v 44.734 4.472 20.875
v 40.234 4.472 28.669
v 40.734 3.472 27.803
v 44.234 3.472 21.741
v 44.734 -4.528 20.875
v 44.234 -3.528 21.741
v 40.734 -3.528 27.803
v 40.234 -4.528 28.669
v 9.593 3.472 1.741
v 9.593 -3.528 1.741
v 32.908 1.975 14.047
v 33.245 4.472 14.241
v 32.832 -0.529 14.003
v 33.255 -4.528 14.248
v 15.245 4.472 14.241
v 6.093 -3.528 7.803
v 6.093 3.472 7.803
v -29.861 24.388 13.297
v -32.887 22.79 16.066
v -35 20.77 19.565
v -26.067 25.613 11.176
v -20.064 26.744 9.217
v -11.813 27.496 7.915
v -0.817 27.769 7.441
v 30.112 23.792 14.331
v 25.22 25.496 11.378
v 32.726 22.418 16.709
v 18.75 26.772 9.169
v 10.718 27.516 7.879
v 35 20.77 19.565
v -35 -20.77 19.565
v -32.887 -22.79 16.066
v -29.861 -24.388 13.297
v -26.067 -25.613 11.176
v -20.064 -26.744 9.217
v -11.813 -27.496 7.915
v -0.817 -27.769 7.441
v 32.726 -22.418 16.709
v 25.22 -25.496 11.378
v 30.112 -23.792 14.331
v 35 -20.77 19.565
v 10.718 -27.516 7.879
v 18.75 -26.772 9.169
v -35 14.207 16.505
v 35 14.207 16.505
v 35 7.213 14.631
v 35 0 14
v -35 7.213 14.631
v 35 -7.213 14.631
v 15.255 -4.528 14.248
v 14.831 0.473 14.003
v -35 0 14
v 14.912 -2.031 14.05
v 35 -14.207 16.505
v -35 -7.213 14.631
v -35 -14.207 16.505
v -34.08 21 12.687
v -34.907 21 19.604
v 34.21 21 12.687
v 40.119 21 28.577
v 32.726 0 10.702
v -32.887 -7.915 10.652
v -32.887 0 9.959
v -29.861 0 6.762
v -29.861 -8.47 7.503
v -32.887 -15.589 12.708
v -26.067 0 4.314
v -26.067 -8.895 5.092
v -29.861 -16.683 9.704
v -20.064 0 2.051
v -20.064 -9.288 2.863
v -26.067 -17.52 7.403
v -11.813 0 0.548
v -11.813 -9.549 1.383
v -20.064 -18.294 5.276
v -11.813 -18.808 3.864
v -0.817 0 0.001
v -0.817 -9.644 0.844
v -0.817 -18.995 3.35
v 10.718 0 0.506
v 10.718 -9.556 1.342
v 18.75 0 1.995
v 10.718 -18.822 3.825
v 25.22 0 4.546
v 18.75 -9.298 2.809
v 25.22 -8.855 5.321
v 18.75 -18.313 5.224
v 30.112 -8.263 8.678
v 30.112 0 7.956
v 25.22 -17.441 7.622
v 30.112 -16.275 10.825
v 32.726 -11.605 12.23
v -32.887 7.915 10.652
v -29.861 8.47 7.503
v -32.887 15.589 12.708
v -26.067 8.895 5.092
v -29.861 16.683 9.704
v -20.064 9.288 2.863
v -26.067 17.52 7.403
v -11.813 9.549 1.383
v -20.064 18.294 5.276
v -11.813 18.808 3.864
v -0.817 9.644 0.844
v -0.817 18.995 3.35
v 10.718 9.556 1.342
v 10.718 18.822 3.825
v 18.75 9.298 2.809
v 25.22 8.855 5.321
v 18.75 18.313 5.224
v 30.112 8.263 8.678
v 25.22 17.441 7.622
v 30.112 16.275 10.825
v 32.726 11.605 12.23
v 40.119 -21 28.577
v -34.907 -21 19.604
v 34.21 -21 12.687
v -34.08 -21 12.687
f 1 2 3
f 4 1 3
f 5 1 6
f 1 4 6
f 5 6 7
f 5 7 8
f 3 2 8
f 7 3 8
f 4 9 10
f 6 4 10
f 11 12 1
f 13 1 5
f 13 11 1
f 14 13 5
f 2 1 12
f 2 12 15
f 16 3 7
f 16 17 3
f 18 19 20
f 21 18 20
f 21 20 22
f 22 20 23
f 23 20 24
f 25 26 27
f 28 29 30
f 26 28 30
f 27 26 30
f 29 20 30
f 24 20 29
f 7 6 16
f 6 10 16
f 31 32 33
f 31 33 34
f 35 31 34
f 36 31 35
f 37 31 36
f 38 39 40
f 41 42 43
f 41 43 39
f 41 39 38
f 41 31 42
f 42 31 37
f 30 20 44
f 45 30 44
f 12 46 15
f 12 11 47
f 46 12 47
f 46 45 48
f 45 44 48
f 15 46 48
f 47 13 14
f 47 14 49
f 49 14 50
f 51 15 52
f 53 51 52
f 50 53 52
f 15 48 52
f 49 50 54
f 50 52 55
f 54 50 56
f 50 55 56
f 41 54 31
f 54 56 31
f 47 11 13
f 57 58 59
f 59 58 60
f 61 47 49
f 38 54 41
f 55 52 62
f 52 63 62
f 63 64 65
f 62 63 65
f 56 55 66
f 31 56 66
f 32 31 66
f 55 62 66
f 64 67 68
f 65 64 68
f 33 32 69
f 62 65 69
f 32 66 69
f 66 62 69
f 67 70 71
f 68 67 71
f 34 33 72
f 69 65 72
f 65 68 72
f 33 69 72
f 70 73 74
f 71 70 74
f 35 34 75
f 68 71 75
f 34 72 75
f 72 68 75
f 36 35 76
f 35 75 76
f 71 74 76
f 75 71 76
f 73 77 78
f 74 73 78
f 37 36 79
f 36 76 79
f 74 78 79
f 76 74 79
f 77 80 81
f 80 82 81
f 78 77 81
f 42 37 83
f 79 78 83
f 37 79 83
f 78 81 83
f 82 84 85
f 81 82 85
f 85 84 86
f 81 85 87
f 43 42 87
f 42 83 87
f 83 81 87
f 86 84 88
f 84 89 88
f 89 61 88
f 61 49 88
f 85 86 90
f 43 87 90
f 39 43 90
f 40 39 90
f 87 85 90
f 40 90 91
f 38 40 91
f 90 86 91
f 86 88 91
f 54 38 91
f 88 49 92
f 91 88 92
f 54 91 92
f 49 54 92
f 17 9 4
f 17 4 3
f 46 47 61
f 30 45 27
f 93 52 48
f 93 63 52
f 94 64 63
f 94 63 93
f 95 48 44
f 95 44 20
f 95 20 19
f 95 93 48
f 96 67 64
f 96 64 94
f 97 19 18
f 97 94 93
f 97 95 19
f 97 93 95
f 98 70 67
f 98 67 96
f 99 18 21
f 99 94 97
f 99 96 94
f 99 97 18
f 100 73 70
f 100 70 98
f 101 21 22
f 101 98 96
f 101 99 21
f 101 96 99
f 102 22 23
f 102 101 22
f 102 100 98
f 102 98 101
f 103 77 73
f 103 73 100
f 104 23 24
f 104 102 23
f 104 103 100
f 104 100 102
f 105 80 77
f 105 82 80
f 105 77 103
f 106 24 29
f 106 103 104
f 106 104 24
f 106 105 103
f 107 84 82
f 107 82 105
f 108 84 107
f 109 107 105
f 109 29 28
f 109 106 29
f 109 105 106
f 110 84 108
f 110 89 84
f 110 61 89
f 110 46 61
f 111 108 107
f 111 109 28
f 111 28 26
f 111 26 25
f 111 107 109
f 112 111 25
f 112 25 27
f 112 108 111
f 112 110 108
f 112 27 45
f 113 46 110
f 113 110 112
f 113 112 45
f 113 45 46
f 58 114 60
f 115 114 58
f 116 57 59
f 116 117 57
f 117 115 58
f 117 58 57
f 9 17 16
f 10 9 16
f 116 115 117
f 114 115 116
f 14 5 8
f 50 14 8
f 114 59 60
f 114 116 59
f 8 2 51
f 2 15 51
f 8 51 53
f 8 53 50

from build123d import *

# Parameters (mm, degrees)
F1_ANGLE = 60
F4_W     = 9
F4_H     = 9
F4_W_2   = 7
F4_H_2   = 7
F5_DEPTH = 25
F6_DEPTH = 15
F7_DEPTH = 25
F9_DEPTH = 21


with BuildPart() as f1:
    # F0 (on Front) → F1 (revolve, symmetric)
    with BuildSketch(Plane.XZ) as f1_sk:
        with BuildLine():
            add(Edge.make_bspline(
                [(-35, 14), (-30.648278, 1.834071), (1.345525, -1.881435), (27.957227, 1.928799), (35, 14)],
                knots=[0, 0, 0, 0, 37.696154, 75.392307, 75.392307, 75.392307, 75.392307], degree=3))
            Line((35, 14), (-35, 14))
        make_face()
    revolve(axis=Axis((3.602739, 0, 55.539034), (1, 0, 0)), revolution_arc=F1_ANGLE / 2)
    revolve(f1_sk.sketch, axis=Axis((3.602739, 0, 55.539034), (-1, 0, 0)), revolution_arc=F1_ANGLE / 2)

    # F4 (on face) → F5 (join)
    with BuildSketch(Plane(origin=(29.599278, 0, 17.089151), x_dir=(0, -1, 0), z_dir=(-0.866025, 0, -0.5))):
        with Locations((0.028123, 0.211167)):
            Rectangle(F4_W, F4_H)
        with Locations((0.028123, 0.211167)):
            Rectangle(F4_W_2, F4_H_2, mode=Mode.SUBTRACT)
    extrude(amount=F5_DEPTH)

    # F4 (on face) → F6 (join)
    with BuildSketch(Plane(origin=(29.599278, 0, 17.089151), x_dir=(0, -1, 0), z_dir=(-0.866025, 0, -0.5))):
        with Locations((0.028123, 0.211167)):
            Rectangle(F4_W, F4_H)
        with Locations((0.028123, 0.211167)):
            Rectangle(F4_W_2, F4_H_2, mode=Mode.SUBTRACT)
    extrude(amount=-F6_DEPTH)

    # F4 (on face) → F7 (cut)
    with BuildSketch(Plane(origin=(29.599278, 0, 17.089151), x_dir=(0, -1, 0), z_dir=(-0.866025, 0, -0.5))):
        with Locations((0.028123, 0.211167)):
            Rectangle(F4_W_2, F4_H_2)
    extrude(amount=F7_DEPTH, mode=Mode.SUBTRACT)


with BuildPart() as f9:
    # F8 (on Front) → F9 (new body, symmetric)
    with BuildSketch(Plane.XZ):
        Polygon((34.209505, 12.686644), (40.119223, 28.57714), (-34.907099, 19.603891), (-34.079787, 12.686644), align=None)
    extrude(amount=F9_DEPTH, both=True)


solid = Compound([f1.part, f9.part])
